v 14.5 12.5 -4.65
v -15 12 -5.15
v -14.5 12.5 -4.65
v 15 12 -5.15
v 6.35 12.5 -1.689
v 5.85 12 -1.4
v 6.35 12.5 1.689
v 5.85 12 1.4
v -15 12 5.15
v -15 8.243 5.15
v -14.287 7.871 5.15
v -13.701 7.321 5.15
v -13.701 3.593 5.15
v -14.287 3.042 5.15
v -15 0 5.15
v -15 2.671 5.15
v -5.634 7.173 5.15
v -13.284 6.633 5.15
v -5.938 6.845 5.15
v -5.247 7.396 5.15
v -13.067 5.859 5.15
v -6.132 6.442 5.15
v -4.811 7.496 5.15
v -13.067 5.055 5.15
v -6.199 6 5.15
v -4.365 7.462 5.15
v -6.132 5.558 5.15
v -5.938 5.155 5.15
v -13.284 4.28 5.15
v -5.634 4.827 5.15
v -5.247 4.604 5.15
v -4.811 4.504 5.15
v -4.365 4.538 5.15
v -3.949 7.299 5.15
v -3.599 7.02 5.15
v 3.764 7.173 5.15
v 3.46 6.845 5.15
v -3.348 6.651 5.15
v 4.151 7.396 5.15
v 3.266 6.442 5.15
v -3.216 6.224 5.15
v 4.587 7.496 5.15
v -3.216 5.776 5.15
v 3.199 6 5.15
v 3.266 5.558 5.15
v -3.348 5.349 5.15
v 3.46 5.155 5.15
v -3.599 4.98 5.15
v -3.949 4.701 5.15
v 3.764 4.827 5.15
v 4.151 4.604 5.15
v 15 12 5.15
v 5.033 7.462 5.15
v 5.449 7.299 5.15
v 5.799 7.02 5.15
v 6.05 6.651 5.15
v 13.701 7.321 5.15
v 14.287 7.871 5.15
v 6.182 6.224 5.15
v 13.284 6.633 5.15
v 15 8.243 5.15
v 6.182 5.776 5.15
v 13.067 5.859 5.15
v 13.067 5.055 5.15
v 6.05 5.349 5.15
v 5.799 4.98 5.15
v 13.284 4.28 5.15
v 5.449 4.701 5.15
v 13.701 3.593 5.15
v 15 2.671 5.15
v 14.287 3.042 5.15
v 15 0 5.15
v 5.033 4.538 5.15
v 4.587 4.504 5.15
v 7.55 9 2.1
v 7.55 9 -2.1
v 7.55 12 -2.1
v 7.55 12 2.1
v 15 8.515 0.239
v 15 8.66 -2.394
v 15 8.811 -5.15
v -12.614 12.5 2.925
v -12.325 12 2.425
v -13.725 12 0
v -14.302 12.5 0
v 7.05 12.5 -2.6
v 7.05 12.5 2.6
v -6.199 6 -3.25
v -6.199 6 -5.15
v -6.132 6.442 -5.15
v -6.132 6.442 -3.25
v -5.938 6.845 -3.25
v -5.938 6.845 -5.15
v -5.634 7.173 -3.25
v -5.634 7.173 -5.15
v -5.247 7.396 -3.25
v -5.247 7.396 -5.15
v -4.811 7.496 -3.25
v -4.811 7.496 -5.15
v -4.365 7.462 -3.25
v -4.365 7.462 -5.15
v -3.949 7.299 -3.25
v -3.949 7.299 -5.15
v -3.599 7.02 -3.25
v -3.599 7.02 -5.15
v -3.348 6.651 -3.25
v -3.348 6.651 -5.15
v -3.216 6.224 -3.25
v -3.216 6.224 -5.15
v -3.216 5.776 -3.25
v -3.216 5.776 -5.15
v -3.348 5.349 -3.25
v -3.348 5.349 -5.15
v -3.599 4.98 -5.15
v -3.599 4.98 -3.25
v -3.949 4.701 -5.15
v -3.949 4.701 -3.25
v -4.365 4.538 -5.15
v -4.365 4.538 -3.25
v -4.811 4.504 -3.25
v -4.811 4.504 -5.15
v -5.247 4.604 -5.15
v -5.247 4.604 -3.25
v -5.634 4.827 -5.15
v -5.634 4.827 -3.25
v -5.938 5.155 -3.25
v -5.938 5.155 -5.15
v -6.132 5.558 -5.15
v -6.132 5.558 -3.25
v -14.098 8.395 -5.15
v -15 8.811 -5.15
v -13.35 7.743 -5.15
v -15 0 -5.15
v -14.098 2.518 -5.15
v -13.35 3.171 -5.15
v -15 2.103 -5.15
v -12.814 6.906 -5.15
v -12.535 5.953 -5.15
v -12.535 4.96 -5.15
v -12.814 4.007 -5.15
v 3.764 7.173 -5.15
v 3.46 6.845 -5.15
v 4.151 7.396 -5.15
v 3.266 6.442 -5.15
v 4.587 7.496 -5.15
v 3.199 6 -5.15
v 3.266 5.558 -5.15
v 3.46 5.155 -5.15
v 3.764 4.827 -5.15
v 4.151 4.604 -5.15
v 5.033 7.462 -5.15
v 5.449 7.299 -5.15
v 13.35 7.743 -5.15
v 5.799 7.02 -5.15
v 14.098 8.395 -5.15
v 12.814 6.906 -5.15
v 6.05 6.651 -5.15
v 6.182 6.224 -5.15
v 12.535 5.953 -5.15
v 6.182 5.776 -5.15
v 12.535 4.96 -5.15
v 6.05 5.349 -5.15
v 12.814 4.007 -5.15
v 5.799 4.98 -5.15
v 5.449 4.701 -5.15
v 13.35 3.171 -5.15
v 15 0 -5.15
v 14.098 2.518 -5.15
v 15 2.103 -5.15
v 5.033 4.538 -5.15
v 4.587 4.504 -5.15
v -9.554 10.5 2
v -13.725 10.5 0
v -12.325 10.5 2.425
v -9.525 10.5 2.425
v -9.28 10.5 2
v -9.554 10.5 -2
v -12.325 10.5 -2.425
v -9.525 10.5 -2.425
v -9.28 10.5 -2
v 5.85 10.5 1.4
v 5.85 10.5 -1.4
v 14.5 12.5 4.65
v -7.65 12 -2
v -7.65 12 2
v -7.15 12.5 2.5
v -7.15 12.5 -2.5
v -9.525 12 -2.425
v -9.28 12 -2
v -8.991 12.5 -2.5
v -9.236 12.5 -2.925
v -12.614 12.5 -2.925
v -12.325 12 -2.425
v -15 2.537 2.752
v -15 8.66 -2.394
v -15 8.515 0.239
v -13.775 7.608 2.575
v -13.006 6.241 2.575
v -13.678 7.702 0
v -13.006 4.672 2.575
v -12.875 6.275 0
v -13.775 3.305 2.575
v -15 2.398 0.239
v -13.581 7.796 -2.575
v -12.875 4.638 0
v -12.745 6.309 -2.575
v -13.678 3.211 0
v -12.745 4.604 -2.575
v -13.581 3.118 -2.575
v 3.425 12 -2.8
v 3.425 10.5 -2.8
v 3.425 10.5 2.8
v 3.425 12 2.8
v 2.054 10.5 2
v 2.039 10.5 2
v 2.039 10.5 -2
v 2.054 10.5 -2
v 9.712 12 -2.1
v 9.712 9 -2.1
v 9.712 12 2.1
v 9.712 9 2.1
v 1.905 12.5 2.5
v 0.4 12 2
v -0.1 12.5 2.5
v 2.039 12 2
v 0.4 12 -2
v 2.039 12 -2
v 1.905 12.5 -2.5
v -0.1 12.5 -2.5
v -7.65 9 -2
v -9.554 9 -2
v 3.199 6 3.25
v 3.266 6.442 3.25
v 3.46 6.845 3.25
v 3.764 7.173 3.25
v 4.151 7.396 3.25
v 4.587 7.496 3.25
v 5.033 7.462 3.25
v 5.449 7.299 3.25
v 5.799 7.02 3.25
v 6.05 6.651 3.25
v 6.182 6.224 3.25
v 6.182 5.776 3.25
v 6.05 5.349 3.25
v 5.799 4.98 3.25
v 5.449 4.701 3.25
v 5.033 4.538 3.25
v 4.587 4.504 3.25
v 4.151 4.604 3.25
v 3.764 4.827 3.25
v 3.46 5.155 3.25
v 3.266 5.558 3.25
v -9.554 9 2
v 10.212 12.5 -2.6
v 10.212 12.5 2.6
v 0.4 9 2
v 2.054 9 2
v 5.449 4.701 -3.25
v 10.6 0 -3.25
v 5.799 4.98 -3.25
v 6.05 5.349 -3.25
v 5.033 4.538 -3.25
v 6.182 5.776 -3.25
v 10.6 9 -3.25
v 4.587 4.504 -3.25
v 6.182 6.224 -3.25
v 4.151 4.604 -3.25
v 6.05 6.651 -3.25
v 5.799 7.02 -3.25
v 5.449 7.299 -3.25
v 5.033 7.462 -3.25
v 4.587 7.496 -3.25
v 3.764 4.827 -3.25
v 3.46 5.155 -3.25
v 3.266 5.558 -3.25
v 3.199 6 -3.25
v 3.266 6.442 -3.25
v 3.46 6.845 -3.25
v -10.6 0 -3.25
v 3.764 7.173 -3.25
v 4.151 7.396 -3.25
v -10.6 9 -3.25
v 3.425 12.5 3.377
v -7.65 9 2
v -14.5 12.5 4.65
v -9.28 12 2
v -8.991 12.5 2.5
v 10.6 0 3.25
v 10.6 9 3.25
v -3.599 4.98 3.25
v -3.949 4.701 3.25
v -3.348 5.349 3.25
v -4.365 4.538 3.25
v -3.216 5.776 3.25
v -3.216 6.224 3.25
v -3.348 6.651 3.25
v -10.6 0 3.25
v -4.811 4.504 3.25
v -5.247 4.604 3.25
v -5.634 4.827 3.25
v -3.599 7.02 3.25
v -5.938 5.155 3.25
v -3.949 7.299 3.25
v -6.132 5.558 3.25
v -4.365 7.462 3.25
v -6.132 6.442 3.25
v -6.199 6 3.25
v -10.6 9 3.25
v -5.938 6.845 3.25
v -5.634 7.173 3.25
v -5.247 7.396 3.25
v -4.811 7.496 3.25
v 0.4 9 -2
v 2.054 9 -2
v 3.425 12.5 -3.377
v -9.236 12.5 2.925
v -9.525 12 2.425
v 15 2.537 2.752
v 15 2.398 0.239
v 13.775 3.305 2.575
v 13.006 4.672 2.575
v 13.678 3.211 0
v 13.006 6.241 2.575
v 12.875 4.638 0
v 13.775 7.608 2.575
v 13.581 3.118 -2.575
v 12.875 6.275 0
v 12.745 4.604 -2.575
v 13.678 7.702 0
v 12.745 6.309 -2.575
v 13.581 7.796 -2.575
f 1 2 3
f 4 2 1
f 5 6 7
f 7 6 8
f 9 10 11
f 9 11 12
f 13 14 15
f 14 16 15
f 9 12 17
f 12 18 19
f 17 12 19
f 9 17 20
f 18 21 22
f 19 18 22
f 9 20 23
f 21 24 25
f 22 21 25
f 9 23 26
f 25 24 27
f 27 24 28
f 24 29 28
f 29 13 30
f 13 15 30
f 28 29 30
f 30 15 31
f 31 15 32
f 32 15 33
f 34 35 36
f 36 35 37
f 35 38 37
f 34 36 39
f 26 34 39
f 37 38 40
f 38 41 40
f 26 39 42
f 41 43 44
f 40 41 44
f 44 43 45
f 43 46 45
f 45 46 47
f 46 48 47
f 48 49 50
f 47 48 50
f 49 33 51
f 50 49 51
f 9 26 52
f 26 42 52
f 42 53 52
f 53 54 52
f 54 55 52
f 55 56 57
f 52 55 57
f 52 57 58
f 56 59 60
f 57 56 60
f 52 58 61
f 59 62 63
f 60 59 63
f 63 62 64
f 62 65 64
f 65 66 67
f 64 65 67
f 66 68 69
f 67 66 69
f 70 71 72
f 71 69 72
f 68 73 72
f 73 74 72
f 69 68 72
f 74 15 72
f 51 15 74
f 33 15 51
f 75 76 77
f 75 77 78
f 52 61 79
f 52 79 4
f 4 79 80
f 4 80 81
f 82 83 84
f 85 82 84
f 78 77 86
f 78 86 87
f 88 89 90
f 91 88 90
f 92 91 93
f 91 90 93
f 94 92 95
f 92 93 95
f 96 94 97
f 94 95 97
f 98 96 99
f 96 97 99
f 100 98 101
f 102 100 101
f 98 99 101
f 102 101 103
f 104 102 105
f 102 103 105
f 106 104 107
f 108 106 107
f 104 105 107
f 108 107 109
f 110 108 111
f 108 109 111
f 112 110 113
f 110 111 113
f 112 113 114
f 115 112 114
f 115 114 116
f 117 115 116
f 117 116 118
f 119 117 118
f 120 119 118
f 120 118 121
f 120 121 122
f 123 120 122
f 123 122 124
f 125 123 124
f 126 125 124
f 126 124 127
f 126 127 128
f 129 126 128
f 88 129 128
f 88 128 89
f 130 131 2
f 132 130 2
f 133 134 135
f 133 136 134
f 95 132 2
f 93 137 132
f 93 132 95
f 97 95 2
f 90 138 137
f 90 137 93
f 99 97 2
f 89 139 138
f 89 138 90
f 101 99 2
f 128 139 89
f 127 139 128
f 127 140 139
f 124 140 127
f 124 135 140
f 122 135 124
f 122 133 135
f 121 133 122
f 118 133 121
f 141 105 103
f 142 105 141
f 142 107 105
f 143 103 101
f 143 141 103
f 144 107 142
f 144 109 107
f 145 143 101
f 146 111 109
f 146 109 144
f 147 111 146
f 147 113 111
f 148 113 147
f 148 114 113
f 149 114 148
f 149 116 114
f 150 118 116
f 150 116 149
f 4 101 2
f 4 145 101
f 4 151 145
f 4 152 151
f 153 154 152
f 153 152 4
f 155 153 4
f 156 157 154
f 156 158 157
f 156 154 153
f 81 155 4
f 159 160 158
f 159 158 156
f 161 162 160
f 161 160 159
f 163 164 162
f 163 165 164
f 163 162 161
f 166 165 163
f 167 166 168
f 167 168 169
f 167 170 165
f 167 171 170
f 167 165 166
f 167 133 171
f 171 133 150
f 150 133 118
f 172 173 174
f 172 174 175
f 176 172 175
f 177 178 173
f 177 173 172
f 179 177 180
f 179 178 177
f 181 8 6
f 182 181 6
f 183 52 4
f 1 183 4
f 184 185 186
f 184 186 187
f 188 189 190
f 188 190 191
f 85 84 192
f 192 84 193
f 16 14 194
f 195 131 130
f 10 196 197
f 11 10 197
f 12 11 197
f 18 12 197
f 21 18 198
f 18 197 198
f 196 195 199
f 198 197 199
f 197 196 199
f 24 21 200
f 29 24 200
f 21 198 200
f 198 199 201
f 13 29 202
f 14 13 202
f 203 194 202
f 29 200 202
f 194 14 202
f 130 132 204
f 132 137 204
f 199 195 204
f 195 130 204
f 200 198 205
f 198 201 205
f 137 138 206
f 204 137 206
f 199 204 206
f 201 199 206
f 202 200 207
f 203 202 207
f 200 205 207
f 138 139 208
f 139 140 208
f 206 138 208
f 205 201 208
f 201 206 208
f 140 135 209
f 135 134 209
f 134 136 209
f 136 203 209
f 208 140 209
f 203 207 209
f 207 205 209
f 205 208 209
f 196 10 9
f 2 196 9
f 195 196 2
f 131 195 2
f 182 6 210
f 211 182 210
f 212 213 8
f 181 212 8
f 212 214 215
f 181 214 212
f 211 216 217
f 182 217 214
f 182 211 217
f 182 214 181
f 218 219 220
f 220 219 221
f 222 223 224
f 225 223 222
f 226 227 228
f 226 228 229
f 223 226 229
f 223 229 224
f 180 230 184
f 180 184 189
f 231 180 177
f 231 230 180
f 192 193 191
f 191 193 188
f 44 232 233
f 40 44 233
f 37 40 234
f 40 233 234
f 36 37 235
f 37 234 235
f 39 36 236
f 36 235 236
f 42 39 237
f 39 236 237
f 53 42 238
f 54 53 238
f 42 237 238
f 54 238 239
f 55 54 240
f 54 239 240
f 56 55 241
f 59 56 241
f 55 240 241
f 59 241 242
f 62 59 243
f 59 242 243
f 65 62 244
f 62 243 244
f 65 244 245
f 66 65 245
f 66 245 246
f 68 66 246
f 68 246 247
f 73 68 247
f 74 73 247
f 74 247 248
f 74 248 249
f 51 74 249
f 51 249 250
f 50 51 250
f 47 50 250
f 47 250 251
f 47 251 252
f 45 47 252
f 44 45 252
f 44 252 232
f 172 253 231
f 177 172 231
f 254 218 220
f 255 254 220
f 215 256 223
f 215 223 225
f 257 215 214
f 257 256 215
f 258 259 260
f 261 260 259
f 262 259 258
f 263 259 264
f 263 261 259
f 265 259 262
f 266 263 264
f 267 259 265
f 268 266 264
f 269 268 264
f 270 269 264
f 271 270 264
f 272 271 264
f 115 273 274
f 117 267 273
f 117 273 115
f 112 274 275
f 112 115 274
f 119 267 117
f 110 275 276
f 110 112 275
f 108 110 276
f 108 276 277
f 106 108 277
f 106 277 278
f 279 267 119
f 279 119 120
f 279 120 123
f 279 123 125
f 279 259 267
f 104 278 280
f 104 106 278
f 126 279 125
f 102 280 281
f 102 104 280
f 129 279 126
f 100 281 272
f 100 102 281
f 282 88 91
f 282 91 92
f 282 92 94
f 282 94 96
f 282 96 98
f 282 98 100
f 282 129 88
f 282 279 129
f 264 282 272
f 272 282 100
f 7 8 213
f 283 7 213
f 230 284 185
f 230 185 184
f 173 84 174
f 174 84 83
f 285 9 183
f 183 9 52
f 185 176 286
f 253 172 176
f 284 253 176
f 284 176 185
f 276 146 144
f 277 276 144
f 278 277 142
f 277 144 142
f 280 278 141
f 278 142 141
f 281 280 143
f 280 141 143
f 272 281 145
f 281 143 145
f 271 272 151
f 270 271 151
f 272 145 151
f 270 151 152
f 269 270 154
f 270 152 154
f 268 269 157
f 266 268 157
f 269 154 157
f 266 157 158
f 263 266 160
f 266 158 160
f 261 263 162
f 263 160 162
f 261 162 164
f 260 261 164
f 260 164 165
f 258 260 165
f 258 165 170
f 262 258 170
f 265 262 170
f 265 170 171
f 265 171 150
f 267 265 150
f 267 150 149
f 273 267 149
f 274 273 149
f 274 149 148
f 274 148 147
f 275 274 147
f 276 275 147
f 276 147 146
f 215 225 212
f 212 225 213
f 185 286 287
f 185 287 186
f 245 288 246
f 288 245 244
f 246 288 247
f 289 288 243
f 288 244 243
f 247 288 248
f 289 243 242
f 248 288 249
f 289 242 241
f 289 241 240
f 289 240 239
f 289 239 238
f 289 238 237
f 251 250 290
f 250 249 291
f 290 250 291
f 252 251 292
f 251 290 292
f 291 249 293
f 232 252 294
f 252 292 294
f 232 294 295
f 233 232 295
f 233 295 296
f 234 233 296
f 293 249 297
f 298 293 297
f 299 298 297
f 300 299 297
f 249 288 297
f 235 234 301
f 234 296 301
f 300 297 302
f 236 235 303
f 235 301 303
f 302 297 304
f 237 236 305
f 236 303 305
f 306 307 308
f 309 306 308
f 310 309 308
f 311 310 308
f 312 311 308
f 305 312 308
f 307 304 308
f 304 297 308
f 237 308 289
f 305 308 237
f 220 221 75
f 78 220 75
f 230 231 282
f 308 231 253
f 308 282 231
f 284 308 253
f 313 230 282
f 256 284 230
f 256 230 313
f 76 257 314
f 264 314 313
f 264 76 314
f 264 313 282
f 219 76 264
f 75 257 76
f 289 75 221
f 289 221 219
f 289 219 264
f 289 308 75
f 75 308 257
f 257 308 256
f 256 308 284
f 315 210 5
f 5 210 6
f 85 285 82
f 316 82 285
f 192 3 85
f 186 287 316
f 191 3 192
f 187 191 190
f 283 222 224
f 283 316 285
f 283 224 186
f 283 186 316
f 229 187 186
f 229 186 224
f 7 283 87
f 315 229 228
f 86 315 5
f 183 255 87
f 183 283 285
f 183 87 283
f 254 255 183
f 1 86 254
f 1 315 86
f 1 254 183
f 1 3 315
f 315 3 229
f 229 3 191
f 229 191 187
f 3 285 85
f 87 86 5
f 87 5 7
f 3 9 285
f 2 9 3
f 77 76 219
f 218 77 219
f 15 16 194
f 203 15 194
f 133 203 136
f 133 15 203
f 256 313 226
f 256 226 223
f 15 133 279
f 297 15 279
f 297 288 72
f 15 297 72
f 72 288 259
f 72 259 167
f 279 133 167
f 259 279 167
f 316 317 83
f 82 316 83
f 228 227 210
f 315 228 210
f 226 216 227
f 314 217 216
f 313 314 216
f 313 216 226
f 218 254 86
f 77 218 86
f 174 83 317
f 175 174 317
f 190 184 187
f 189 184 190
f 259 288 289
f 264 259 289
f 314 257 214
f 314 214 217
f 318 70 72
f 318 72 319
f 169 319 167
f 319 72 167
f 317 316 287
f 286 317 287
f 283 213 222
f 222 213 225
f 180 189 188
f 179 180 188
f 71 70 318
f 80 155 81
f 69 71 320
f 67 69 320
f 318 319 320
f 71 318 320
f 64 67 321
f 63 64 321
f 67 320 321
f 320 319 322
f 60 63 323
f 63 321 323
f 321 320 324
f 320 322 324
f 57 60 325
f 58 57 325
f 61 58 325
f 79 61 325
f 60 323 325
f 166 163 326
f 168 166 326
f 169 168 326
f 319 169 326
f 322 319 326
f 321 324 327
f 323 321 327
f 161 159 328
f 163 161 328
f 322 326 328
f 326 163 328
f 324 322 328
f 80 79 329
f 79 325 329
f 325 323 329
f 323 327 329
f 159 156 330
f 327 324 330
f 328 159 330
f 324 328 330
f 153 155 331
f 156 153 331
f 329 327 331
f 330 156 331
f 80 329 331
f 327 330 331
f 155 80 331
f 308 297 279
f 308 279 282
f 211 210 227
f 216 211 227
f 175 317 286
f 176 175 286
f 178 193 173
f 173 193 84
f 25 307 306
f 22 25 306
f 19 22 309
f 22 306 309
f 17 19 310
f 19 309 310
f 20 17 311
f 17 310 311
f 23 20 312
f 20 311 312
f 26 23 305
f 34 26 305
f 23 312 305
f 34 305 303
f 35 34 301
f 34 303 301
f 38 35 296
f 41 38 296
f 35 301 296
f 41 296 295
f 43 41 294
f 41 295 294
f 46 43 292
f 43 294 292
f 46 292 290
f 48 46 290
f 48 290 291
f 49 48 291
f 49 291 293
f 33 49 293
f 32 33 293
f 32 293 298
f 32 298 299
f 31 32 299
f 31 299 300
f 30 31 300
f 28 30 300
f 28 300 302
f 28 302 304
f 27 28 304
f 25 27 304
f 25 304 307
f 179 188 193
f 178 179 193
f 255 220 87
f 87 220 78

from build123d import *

# Parameters (mm, degrees)
SKETCH1_W                    = 30
SKETCH1_H                    = 10.3
SKETCH1_W_2                  = 21
SKETCH1_H_2                  = 6.3
BOSS_EXTRUDE1_DEPTH          = 10.5
F_3_0_3_DIAMETER_HOLE1_D     = 3
SKETCH4_W                    = 30
SKETCH4_H                    = 10.3
SKETCH4_R                    = 2.425
BOSS_EXTRUDE2_DEPTH          = 2
CUT_EXTRUDE2_START           = -4
CUT_EXTRUDE2_DEPTH           = 4
CUT_EXTRUDE3_START           = -4
CUT_EXTRUDE3_DEPTH           = 4
MOVE_START                   = -10.6
MOVE_FACE1_OUTLINE_W         = 10.5
MOVE_FACE1_OUTLINE_H         = 6.5
MOVE_FACE1_DEPTH             = 21.2
MOVE_START_2                 = 7.55
MOVE_FACE1_2_OUTLINE_W       = 2
MOVE_FACE1_2_OUTLINE_H       = 4.2
MOVE_FACE1_2_DEPTH           = 2.162306716
BOSS_EXTRUDE3_START          = 1.5
BOSS_EXTRUDE3_DEPTH          = 1.5
CUT_EXTRUDE4_DEPTH           = 2
DELETEFACE1_START            = 10.5
DELETEFACE1_DEPTH            = 2
CHAMFER1_SIZE                = 0.5
SKETCH10_R                   = 3.5
CUT_EXTRUDE5_DEPTH           = 10.3
CUT_EXTRUDE5_DRAFT           = -3
CUT_EXTRUDE5_PROFILE_2_DEPTH = 10.3
CUT_EXTRUDE5_PROFILE_2_DRAFT = -3


# Read off the part's stored shape, not the designer's step: Move Face1, DeleteFace1
with BuildPart() as part:
    # Sketch1 → Boss-Extrude1 (new body)
    with BuildSketch(Plane(origin=(0, 0, 0), x_dir=(1, 0, 0), z_dir=(0, 1, 0))):
        Rectangle(SKETCH1_W, SKETCH1_H)
        Rectangle(SKETCH1_W_2, SKETCH1_H_2, mode=Mode.SUBTRACT)
    extrude(amount=BOSS_EXTRUDE1_DEPTH)

    # Ø3.0 (3) Diameter Hole1 (through all)
    with Locations(Plane.XY.offset(5.15)):
        with Locations((-4.699, 6), (4.699, 6)):
            Hole(F_3_0_3_DIAMETER_HOLE1_D / 2)

    # Sketch4 → Boss-Extrude2 (add)
    with BuildSketch(Plane(origin=(0, 10.5, 0), x_dir=(1, 0, 0), z_dir=(0, 1, 0))):
        Rectangle(SKETCH4_W, SKETCH4_H)
        with Locations(Location((-10.925, 0, 0), (0, 0, 79.906343141))):
            Circle(SKETCH4_R, mode=Mode.SUBTRACT)
        with Locations(Location((10.925, 0, 0), (0, 0, 100.093656859))):
            Circle(SKETCH4_R, mode=Mode.SUBTRACT)
        with Locations(Location((3.425, 0, 0), (0, 0, 270))):
            Circle(SKETCH4_R, mode=Mode.SUBTRACT)
    extrude(amount=BOSS_EXTRUDE2_DEPTH)

    # Sketch5 → Cut-Extrude2 (cut)
    with BuildSketch(Plane(origin=(0, 12.5, 0), x_dir=(1, 0, 0), z_dir=(0, 1, 0)).offset(CUT_EXTRUDE2_START)):
        with BuildLine():
            Line((-7.65, 2), (-8.4, 2))
            Line((-8.4, 2), (-9.553641185, 2))
            ThreePointArc((-9.553641185, 2), (-8.779519852, 1.130283122), (-8.5, 0))
            ThreePointArc((-8.5, 0), (-8.779519852, -1.130283122), (-9.553641185, -2))
            Line((-9.553641185, -2), (-8.4, -2))
            Line((-8.4, -2), (-7.65, -2))
            Line((-7.65, -2), (-7.65, 2))
        make_face()
    cut_extrude2 = extrude(amount=CUT_EXTRUDE2_DEPTH, mode=Mode.SUBTRACT)

    # Sketch6 → Cut-Extrude3 (cut)
    with BuildSketch(Plane(origin=(0, 12.5, 0), x_dir=(1, 0, 0), z_dir=(0, 1, 0)).offset(CUT_EXTRUDE3_START)):
        with BuildLine():
            Line((2.053641185, 2), (1, 2))
            Line((1, 2), (0.4, 2))
            Line((0.4, 2), (0.4, -2))
            Line((0.4, -2), (1, -2))
            Line((1, -2), (2.053641185, -2))
            ThreePointArc((2.053641185, -2), (1, 0), (2.053641185, 2))
        make_face()
    extrude(amount=CUT_EXTRUDE3_DEPTH, mode=Mode.SUBTRACT)

    # Mirror1: Cut-Extrude2 across plane
    add(cut_extrude2.mirror(Plane(origin=(0, 0, 0), x_dir=(0, 0, 1), z_dir=(1, 0, 0))), mode=Mode.SUBTRACT)

    # Move Face1 outline → Move Face1 (cut)
    with BuildSketch(Plane.YZ.offset(MOVE_START)):
        with Locations((5.25, 0)):
            Rectangle(MOVE_FACE1_OUTLINE_W, MOVE_FACE1_OUTLINE_H)
    extrude(amount=MOVE_FACE1_DEPTH, mode=Mode.SUBTRACT)

    # Move Face1 2 outline → Move Face1 2 (cut)
    with BuildSketch(Plane.YZ.offset(MOVE_START_2)):
        with Locations((11.5, 0)):
            Rectangle(MOVE_FACE1_2_OUTLINE_W, MOVE_FACE1_2_OUTLINE_H)
    extrude(amount=MOVE_FACE1_2_DEPTH, mode=Mode.SUBTRACT)

    # Sketch7 → Boss-Extrude3 (add)
    # profile 1 of 4: a face of its own
    with BuildSketch(Plane.XZ.offset(-10.5).offset(BOSS_EXTRUDE3_START)):
        with BuildLine():
            Line((9.712306716, -2.1), (7.55, -2.1))
            Line((7.55, -2.1), (7.55, 2.1))
            Line((7.55, 2.1), (9.712306716, 2.1))
            ThreePointArc((9.712306716, 2.1), (10.141357197, 2.294891927), (10.6, 2.403122968))
            Line((10.6, 2.403122968), (10.6, 3.25))
            Line((10.6, 3.25), (-10.6, 3.25))
            Line((-10.6, 3.25), (-10.6, 2.403122968))
            ThreePointArc((-10.6, 2.403122968), (-10.053199943, 2.262871994), (-9.553641185, 2))
            Line((-9.553641185, 2), (-7.65, 2))
            Line((-7.65, 2), (-7.65, -2))
            Line((-7.65, -2), (-9.553641185, -2))
            ThreePointArc((-9.553641185, -2), (-10.053199943, -2.262871994), (-10.6, -2.403122968))
            Line((-10.6, -2.403122968), (-10.6, -3.25))
            Line((-10.6, -3.25), (10.6, -3.25))
            Line((10.6, -3.25), (10.6, -2.403122968))
            ThreePointArc((10.6, -2.403122968), (10.141357197, -2.294891927), (9.712306716, -2.1))
        make_face()
        with BuildLine():
            Line((0.4, -2), (0.4, 2))
            Line((0.4, 2), (2.053641185, 2))
            ThreePointArc((2.053641185, 2), (5.85, 0), (2.053641185, -2))
            Line((2.053641185, -2), (0.4, -2))
        make_face(mode=Mode.SUBTRACT)
    # profile 2 of 4: a face of its own
    with BuildSketch(Plane.XZ.offset(-10.5).offset(BOSS_EXTRUDE3_START)):
        with BuildLine():
            Line((2.053641185, 2), (2.053641185, -2))
            ThreePointArc((2.053641185, -2), (5.85, 0), (2.053641185, 2))
        make_face()
    # profile 3 of 4: a face of its own
    with BuildSketch(Plane.XZ.offset(-10.5).offset(BOSS_EXTRUDE3_START)):
        with BuildLine():
            Line((-9.553641185, 2), (-9.553641185, -2))
            ThreePointArc((-9.553641185, -2), (-10.053199943, -2.262871994), (-10.6, -2.403122968))
            Line((-10.6, -2.403122968), (-10.6, 2.403122968))
            ThreePointArc((-10.6, 2.403122968), (-10.053199943, 2.262871994), (-9.553641185, 2))
        make_face()
    # profile 4 of 4: a face of its own
    with BuildSketch(Plane.XZ.offset(-10.5).offset(BOSS_EXTRUDE3_START)):
        with BuildLine():
            Line((10.6, 2.403122968), (10.6, -2.403122968))
            ThreePointArc((10.6, -2.403122968), (10.141357197, -2.294891927), (9.712306716, -2.1))
            Line((9.712306716, -2.1), (9.712306716, 2.1))
            ThreePointArc((9.712306716, 2.1), (10.141357197, 2.294891927), (10.6, 2.403122968))
        make_face()
    extrude(amount=-BOSS_EXTRUDE3_DEPTH)

    # Sketch9 → Cut-Extrude4 (cut)
    with BuildSketch(Plane(origin=(0, 12.5, 0), x_dir=(1, 0, 0), z_dir=(0, 1, 0))):
        Polygon((-12.325074403, 2.425), (-13.725148806, 0), (-12.325074403, -2.425), (-9.524925597, -2.425), (-8.124851194, 0), (-9.524925597, 2.425), align=None)
        Polygon((1, 1.400074403), (1, -1.400074403), (3.425, -2.800148806), (5.85, -1.400074403), (5.85, 1.400074403), (3.425, 2.800148806), align=None)
        Polygon((11.64973184, 2.704736049), (8.944995791, 1.980004209), (8.220263951, -0.72473184), (10.20026816, -2.704736049), (12.905004209, -1.980004209), (13.629736049, 0.72473184), align=None)
    extrude(amount=-CUT_EXTRUDE4_DEPTH, mode=Mode.SUBTRACT)

    # DeleteFace1 outline → DeleteFace1 (add)
    with BuildSketch(Plane(origin=(0, 0, 0), x_dir=(1, 0, 0), z_dir=(0, 1, 0)).offset(DELETEFACE1_START)):
        Polygon((9.392826181, 2.1), (9.712306716, 2.1), (9.712306716, -2.1), (9.595532111, -2.1), (10.20026816, -2.704736049), (12.905004209, -1.980004209), (13.629736049, 0.72473184), (11.64973184, 2.704736049), align=None)
    extrude(amount=DELETEFACE1_DEPTH)

    # Chamfer1
    chamfer1_edges = [part.edges().sort_by_distance(p)[0] for p in [
        (8.631153358, 12.5, 2.1),
        (7.55, 12.5, 0),
        (8.631153358, 12.5, -2.1),
        (1.219550808, 12.5, 2),
        (-8.464775866, 12.5, -2),
        (-10.925, 12.5, 2.425),
        (-9.402238665, 12.5, 2.2125),
        (-13.025111604, 12.5, 1.2125),
        (-13.025111604, 12.5, -1.2125),
        (-10.925, 12.5, -2.425),
        (-9.402238665, 12.5, -2.2125),
        (2.732050808, 12.5, 2.400074403),
        (4.6375, 12.5, 2.100111604),
        (5.85, 12.5, 0),
        (4.6375, 12.5, -2.100111604),
        (2.732050808, 12.5, -2.400074403),
        (9.712306716, 12.5, 0),
        (0, 12.5, -5.15),
        (-15, 12.5, 0),
        (0, 12.5, 5.15),
        (15, 12.5, 0),
        (-7.65, 12.5, 0),
        (-8.464775866, 12.5, 2),
        (0.4, 12.5, 0),
        (1.219550808, 12.5, -2),
    ]]
    chamfer(chamfer1_edges, length=CHAMFER1_SIZE)


with BuildPart() as cut_extrude5_tool:
    # Sketch10 → Cut-Extrude5 (with draft: the straight prism first)
    with BuildSketch(Plane(origin=(0, 0, -5.15), x_dir=(-1, 0, 0), z_dir=(0, 0, -1))):
        with Locations((16, 5.45673788)):
            Circle(SKETCH10_R)
    extrude(amount=-CUT_EXTRUDE5_DEPTH)
    # Cut-Extrude5: the draft: its side faces are tilted about the plane it starts from
    cut_extrude5_sides = [cut_extrude5_tool.faces().sort_by_distance(p)[0] for p in [
        (-12.5, 5.45673788, 0),
    ]]
    draft(cut_extrude5_sides, Plane(origin=(0, 0, -5.15), x_dir=(-1, 0, 0), z_dir=(0, 0, -1)), CUT_EXTRUDE5_DRAFT)


with BuildPart() as part_1:
    add(part.part)

    # Cut-Extrude5: cut by cut_extrude5_tool
    add(cut_extrude5_tool.part, mode=Mode.SUBTRACT)


with BuildPart() as cut_extrude5_profile_2_tool:
    # Sketch10 → Cut-Extrude5 profile 2 (with draft: the straight prism first)
    with BuildSketch(Plane(origin=(0, 0, -5.15), x_dir=(-1, 0, 0), z_dir=(0, 0, -1))):
        with Locations((-16, 5.45673788)):
            Circle(SKETCH10_R)
    extrude(amount=-CUT_EXTRUDE5_PROFILE_2_DEPTH)
    # Cut-Extrude5 profile 2: the draft: its side faces are tilted about the plane it starts from
    cut_extrude5_profile_2_sides = [cut_extrude5_profile_2_tool.faces().sort_by_distance(p)[0] for p in [
        (19.5, 5.45673788, 0),
    ]]
    draft(cut_extrude5_profile_2_sides, Plane(origin=(0, 0, -5.15), x_dir=(-1, 0, 0), z_dir=(0, 0, -1)), CUT_EXTRUDE5_PROFILE_2_DRAFT)


with BuildPart() as part_2:
    add(part_1.part)

    # Cut-Extrude5 profile 2: cut by cut_extrude5_profile_2_tool
    add(cut_extrude5_profile_2_tool.part, mode=Mode.SUBTRACT)


solid = part_2.part
